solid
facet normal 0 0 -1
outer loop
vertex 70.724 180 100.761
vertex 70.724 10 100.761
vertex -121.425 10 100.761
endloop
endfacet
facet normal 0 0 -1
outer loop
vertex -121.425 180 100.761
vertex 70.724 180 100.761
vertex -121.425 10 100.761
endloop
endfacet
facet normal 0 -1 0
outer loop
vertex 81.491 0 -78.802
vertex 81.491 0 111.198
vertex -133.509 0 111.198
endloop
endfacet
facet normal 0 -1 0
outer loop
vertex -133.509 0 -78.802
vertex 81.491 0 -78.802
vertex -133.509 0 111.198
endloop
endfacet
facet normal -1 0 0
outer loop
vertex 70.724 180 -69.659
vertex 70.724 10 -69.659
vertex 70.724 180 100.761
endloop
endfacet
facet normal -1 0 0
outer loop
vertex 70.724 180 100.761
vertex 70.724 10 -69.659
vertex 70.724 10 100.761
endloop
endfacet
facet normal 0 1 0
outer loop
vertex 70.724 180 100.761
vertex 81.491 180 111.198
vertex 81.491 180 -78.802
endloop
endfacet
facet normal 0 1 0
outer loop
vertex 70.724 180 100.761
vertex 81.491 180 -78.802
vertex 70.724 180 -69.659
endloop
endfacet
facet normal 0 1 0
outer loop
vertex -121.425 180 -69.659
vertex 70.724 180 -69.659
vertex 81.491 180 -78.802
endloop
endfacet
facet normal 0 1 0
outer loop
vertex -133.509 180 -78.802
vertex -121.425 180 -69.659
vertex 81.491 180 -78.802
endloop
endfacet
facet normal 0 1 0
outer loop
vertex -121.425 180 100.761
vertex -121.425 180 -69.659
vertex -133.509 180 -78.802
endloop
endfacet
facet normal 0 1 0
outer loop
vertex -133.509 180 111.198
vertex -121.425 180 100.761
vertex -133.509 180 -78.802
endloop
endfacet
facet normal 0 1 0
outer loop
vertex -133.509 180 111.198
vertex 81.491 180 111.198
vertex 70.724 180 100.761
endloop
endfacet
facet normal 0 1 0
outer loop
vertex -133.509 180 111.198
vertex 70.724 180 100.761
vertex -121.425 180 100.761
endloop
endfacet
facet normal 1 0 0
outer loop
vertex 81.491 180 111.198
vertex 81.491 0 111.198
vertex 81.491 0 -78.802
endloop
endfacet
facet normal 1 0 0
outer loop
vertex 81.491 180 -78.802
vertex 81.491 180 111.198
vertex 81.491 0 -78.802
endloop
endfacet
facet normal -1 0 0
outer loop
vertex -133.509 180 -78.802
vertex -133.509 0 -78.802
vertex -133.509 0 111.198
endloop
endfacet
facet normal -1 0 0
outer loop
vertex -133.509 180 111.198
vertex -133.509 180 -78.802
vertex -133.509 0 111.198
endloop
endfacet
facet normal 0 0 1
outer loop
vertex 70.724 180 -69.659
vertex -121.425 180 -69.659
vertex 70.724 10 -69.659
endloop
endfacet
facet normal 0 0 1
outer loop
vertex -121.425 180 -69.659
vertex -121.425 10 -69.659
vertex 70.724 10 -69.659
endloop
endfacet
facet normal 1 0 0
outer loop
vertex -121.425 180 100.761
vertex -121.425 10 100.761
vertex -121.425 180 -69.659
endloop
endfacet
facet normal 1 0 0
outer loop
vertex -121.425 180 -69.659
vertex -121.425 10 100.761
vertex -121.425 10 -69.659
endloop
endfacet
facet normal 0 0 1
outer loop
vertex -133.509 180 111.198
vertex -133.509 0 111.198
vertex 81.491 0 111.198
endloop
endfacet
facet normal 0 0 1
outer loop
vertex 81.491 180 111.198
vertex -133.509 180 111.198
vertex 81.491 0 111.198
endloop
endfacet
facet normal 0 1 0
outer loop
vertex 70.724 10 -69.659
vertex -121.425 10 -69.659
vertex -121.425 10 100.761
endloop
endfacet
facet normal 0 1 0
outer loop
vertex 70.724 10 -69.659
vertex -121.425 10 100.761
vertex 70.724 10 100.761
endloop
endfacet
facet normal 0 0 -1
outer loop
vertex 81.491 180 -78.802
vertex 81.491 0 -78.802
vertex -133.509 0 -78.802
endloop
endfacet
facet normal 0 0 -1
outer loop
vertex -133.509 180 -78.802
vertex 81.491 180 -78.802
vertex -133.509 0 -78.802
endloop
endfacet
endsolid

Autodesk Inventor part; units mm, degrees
ref_plane "YZ Plane" through (0, 0, 0) normal (1, 0, 0) x (0, 1, 0)
ref_plane "XZ Plane" through (0, 0, 0) normal (0, 1, 0) x (-1, 0, 0)
ref_plane "XY Plane" through (0, 0, 0) normal (0, 0, 1) x (1, 0, 0)
sketch "Sketch1" plane through (0, 0, 0) normal (0, 1, 0) x (-1, 0, 0)
  line L0 (-81.4912, -78.8023) -> (133.5088, -78.8023)
  line L1 (133.5088, -78.8023) -> (133.5088, 111.1977)
  line L2 (133.5088, 111.1977) -> (-81.4912, 111.1977)
  line L3 (-81.4912, 111.1977) -> (-81.4912, -78.8023)
  point P0 (0, 0)
  dimension "d0" = 190
  dimension "d1" = 215
extrude "Extrusion1" add sketch "Sketch1" along normal blind 180
sketch "Sketch2" plane through (0, 180, 0) normal (0, 1, 0) x (1, 0, 0)
  line L0 (70.7245, -100.7611) -> (-121.4246, -100.7611)
  line L1 (-121.4246, -100.7611) -> (-121.4246, 69.6594)
  line L2 (-121.4246, 69.6594) -> (70.7245, 69.6594)
  line L3 (70.7245, 69.6594) -> (70.7245, -100.7611)
  point P0 (0, 0)
extrude "Extrusion2" cut sketch "Sketch2" along normal mid plane 340
properties part number "tray2"
